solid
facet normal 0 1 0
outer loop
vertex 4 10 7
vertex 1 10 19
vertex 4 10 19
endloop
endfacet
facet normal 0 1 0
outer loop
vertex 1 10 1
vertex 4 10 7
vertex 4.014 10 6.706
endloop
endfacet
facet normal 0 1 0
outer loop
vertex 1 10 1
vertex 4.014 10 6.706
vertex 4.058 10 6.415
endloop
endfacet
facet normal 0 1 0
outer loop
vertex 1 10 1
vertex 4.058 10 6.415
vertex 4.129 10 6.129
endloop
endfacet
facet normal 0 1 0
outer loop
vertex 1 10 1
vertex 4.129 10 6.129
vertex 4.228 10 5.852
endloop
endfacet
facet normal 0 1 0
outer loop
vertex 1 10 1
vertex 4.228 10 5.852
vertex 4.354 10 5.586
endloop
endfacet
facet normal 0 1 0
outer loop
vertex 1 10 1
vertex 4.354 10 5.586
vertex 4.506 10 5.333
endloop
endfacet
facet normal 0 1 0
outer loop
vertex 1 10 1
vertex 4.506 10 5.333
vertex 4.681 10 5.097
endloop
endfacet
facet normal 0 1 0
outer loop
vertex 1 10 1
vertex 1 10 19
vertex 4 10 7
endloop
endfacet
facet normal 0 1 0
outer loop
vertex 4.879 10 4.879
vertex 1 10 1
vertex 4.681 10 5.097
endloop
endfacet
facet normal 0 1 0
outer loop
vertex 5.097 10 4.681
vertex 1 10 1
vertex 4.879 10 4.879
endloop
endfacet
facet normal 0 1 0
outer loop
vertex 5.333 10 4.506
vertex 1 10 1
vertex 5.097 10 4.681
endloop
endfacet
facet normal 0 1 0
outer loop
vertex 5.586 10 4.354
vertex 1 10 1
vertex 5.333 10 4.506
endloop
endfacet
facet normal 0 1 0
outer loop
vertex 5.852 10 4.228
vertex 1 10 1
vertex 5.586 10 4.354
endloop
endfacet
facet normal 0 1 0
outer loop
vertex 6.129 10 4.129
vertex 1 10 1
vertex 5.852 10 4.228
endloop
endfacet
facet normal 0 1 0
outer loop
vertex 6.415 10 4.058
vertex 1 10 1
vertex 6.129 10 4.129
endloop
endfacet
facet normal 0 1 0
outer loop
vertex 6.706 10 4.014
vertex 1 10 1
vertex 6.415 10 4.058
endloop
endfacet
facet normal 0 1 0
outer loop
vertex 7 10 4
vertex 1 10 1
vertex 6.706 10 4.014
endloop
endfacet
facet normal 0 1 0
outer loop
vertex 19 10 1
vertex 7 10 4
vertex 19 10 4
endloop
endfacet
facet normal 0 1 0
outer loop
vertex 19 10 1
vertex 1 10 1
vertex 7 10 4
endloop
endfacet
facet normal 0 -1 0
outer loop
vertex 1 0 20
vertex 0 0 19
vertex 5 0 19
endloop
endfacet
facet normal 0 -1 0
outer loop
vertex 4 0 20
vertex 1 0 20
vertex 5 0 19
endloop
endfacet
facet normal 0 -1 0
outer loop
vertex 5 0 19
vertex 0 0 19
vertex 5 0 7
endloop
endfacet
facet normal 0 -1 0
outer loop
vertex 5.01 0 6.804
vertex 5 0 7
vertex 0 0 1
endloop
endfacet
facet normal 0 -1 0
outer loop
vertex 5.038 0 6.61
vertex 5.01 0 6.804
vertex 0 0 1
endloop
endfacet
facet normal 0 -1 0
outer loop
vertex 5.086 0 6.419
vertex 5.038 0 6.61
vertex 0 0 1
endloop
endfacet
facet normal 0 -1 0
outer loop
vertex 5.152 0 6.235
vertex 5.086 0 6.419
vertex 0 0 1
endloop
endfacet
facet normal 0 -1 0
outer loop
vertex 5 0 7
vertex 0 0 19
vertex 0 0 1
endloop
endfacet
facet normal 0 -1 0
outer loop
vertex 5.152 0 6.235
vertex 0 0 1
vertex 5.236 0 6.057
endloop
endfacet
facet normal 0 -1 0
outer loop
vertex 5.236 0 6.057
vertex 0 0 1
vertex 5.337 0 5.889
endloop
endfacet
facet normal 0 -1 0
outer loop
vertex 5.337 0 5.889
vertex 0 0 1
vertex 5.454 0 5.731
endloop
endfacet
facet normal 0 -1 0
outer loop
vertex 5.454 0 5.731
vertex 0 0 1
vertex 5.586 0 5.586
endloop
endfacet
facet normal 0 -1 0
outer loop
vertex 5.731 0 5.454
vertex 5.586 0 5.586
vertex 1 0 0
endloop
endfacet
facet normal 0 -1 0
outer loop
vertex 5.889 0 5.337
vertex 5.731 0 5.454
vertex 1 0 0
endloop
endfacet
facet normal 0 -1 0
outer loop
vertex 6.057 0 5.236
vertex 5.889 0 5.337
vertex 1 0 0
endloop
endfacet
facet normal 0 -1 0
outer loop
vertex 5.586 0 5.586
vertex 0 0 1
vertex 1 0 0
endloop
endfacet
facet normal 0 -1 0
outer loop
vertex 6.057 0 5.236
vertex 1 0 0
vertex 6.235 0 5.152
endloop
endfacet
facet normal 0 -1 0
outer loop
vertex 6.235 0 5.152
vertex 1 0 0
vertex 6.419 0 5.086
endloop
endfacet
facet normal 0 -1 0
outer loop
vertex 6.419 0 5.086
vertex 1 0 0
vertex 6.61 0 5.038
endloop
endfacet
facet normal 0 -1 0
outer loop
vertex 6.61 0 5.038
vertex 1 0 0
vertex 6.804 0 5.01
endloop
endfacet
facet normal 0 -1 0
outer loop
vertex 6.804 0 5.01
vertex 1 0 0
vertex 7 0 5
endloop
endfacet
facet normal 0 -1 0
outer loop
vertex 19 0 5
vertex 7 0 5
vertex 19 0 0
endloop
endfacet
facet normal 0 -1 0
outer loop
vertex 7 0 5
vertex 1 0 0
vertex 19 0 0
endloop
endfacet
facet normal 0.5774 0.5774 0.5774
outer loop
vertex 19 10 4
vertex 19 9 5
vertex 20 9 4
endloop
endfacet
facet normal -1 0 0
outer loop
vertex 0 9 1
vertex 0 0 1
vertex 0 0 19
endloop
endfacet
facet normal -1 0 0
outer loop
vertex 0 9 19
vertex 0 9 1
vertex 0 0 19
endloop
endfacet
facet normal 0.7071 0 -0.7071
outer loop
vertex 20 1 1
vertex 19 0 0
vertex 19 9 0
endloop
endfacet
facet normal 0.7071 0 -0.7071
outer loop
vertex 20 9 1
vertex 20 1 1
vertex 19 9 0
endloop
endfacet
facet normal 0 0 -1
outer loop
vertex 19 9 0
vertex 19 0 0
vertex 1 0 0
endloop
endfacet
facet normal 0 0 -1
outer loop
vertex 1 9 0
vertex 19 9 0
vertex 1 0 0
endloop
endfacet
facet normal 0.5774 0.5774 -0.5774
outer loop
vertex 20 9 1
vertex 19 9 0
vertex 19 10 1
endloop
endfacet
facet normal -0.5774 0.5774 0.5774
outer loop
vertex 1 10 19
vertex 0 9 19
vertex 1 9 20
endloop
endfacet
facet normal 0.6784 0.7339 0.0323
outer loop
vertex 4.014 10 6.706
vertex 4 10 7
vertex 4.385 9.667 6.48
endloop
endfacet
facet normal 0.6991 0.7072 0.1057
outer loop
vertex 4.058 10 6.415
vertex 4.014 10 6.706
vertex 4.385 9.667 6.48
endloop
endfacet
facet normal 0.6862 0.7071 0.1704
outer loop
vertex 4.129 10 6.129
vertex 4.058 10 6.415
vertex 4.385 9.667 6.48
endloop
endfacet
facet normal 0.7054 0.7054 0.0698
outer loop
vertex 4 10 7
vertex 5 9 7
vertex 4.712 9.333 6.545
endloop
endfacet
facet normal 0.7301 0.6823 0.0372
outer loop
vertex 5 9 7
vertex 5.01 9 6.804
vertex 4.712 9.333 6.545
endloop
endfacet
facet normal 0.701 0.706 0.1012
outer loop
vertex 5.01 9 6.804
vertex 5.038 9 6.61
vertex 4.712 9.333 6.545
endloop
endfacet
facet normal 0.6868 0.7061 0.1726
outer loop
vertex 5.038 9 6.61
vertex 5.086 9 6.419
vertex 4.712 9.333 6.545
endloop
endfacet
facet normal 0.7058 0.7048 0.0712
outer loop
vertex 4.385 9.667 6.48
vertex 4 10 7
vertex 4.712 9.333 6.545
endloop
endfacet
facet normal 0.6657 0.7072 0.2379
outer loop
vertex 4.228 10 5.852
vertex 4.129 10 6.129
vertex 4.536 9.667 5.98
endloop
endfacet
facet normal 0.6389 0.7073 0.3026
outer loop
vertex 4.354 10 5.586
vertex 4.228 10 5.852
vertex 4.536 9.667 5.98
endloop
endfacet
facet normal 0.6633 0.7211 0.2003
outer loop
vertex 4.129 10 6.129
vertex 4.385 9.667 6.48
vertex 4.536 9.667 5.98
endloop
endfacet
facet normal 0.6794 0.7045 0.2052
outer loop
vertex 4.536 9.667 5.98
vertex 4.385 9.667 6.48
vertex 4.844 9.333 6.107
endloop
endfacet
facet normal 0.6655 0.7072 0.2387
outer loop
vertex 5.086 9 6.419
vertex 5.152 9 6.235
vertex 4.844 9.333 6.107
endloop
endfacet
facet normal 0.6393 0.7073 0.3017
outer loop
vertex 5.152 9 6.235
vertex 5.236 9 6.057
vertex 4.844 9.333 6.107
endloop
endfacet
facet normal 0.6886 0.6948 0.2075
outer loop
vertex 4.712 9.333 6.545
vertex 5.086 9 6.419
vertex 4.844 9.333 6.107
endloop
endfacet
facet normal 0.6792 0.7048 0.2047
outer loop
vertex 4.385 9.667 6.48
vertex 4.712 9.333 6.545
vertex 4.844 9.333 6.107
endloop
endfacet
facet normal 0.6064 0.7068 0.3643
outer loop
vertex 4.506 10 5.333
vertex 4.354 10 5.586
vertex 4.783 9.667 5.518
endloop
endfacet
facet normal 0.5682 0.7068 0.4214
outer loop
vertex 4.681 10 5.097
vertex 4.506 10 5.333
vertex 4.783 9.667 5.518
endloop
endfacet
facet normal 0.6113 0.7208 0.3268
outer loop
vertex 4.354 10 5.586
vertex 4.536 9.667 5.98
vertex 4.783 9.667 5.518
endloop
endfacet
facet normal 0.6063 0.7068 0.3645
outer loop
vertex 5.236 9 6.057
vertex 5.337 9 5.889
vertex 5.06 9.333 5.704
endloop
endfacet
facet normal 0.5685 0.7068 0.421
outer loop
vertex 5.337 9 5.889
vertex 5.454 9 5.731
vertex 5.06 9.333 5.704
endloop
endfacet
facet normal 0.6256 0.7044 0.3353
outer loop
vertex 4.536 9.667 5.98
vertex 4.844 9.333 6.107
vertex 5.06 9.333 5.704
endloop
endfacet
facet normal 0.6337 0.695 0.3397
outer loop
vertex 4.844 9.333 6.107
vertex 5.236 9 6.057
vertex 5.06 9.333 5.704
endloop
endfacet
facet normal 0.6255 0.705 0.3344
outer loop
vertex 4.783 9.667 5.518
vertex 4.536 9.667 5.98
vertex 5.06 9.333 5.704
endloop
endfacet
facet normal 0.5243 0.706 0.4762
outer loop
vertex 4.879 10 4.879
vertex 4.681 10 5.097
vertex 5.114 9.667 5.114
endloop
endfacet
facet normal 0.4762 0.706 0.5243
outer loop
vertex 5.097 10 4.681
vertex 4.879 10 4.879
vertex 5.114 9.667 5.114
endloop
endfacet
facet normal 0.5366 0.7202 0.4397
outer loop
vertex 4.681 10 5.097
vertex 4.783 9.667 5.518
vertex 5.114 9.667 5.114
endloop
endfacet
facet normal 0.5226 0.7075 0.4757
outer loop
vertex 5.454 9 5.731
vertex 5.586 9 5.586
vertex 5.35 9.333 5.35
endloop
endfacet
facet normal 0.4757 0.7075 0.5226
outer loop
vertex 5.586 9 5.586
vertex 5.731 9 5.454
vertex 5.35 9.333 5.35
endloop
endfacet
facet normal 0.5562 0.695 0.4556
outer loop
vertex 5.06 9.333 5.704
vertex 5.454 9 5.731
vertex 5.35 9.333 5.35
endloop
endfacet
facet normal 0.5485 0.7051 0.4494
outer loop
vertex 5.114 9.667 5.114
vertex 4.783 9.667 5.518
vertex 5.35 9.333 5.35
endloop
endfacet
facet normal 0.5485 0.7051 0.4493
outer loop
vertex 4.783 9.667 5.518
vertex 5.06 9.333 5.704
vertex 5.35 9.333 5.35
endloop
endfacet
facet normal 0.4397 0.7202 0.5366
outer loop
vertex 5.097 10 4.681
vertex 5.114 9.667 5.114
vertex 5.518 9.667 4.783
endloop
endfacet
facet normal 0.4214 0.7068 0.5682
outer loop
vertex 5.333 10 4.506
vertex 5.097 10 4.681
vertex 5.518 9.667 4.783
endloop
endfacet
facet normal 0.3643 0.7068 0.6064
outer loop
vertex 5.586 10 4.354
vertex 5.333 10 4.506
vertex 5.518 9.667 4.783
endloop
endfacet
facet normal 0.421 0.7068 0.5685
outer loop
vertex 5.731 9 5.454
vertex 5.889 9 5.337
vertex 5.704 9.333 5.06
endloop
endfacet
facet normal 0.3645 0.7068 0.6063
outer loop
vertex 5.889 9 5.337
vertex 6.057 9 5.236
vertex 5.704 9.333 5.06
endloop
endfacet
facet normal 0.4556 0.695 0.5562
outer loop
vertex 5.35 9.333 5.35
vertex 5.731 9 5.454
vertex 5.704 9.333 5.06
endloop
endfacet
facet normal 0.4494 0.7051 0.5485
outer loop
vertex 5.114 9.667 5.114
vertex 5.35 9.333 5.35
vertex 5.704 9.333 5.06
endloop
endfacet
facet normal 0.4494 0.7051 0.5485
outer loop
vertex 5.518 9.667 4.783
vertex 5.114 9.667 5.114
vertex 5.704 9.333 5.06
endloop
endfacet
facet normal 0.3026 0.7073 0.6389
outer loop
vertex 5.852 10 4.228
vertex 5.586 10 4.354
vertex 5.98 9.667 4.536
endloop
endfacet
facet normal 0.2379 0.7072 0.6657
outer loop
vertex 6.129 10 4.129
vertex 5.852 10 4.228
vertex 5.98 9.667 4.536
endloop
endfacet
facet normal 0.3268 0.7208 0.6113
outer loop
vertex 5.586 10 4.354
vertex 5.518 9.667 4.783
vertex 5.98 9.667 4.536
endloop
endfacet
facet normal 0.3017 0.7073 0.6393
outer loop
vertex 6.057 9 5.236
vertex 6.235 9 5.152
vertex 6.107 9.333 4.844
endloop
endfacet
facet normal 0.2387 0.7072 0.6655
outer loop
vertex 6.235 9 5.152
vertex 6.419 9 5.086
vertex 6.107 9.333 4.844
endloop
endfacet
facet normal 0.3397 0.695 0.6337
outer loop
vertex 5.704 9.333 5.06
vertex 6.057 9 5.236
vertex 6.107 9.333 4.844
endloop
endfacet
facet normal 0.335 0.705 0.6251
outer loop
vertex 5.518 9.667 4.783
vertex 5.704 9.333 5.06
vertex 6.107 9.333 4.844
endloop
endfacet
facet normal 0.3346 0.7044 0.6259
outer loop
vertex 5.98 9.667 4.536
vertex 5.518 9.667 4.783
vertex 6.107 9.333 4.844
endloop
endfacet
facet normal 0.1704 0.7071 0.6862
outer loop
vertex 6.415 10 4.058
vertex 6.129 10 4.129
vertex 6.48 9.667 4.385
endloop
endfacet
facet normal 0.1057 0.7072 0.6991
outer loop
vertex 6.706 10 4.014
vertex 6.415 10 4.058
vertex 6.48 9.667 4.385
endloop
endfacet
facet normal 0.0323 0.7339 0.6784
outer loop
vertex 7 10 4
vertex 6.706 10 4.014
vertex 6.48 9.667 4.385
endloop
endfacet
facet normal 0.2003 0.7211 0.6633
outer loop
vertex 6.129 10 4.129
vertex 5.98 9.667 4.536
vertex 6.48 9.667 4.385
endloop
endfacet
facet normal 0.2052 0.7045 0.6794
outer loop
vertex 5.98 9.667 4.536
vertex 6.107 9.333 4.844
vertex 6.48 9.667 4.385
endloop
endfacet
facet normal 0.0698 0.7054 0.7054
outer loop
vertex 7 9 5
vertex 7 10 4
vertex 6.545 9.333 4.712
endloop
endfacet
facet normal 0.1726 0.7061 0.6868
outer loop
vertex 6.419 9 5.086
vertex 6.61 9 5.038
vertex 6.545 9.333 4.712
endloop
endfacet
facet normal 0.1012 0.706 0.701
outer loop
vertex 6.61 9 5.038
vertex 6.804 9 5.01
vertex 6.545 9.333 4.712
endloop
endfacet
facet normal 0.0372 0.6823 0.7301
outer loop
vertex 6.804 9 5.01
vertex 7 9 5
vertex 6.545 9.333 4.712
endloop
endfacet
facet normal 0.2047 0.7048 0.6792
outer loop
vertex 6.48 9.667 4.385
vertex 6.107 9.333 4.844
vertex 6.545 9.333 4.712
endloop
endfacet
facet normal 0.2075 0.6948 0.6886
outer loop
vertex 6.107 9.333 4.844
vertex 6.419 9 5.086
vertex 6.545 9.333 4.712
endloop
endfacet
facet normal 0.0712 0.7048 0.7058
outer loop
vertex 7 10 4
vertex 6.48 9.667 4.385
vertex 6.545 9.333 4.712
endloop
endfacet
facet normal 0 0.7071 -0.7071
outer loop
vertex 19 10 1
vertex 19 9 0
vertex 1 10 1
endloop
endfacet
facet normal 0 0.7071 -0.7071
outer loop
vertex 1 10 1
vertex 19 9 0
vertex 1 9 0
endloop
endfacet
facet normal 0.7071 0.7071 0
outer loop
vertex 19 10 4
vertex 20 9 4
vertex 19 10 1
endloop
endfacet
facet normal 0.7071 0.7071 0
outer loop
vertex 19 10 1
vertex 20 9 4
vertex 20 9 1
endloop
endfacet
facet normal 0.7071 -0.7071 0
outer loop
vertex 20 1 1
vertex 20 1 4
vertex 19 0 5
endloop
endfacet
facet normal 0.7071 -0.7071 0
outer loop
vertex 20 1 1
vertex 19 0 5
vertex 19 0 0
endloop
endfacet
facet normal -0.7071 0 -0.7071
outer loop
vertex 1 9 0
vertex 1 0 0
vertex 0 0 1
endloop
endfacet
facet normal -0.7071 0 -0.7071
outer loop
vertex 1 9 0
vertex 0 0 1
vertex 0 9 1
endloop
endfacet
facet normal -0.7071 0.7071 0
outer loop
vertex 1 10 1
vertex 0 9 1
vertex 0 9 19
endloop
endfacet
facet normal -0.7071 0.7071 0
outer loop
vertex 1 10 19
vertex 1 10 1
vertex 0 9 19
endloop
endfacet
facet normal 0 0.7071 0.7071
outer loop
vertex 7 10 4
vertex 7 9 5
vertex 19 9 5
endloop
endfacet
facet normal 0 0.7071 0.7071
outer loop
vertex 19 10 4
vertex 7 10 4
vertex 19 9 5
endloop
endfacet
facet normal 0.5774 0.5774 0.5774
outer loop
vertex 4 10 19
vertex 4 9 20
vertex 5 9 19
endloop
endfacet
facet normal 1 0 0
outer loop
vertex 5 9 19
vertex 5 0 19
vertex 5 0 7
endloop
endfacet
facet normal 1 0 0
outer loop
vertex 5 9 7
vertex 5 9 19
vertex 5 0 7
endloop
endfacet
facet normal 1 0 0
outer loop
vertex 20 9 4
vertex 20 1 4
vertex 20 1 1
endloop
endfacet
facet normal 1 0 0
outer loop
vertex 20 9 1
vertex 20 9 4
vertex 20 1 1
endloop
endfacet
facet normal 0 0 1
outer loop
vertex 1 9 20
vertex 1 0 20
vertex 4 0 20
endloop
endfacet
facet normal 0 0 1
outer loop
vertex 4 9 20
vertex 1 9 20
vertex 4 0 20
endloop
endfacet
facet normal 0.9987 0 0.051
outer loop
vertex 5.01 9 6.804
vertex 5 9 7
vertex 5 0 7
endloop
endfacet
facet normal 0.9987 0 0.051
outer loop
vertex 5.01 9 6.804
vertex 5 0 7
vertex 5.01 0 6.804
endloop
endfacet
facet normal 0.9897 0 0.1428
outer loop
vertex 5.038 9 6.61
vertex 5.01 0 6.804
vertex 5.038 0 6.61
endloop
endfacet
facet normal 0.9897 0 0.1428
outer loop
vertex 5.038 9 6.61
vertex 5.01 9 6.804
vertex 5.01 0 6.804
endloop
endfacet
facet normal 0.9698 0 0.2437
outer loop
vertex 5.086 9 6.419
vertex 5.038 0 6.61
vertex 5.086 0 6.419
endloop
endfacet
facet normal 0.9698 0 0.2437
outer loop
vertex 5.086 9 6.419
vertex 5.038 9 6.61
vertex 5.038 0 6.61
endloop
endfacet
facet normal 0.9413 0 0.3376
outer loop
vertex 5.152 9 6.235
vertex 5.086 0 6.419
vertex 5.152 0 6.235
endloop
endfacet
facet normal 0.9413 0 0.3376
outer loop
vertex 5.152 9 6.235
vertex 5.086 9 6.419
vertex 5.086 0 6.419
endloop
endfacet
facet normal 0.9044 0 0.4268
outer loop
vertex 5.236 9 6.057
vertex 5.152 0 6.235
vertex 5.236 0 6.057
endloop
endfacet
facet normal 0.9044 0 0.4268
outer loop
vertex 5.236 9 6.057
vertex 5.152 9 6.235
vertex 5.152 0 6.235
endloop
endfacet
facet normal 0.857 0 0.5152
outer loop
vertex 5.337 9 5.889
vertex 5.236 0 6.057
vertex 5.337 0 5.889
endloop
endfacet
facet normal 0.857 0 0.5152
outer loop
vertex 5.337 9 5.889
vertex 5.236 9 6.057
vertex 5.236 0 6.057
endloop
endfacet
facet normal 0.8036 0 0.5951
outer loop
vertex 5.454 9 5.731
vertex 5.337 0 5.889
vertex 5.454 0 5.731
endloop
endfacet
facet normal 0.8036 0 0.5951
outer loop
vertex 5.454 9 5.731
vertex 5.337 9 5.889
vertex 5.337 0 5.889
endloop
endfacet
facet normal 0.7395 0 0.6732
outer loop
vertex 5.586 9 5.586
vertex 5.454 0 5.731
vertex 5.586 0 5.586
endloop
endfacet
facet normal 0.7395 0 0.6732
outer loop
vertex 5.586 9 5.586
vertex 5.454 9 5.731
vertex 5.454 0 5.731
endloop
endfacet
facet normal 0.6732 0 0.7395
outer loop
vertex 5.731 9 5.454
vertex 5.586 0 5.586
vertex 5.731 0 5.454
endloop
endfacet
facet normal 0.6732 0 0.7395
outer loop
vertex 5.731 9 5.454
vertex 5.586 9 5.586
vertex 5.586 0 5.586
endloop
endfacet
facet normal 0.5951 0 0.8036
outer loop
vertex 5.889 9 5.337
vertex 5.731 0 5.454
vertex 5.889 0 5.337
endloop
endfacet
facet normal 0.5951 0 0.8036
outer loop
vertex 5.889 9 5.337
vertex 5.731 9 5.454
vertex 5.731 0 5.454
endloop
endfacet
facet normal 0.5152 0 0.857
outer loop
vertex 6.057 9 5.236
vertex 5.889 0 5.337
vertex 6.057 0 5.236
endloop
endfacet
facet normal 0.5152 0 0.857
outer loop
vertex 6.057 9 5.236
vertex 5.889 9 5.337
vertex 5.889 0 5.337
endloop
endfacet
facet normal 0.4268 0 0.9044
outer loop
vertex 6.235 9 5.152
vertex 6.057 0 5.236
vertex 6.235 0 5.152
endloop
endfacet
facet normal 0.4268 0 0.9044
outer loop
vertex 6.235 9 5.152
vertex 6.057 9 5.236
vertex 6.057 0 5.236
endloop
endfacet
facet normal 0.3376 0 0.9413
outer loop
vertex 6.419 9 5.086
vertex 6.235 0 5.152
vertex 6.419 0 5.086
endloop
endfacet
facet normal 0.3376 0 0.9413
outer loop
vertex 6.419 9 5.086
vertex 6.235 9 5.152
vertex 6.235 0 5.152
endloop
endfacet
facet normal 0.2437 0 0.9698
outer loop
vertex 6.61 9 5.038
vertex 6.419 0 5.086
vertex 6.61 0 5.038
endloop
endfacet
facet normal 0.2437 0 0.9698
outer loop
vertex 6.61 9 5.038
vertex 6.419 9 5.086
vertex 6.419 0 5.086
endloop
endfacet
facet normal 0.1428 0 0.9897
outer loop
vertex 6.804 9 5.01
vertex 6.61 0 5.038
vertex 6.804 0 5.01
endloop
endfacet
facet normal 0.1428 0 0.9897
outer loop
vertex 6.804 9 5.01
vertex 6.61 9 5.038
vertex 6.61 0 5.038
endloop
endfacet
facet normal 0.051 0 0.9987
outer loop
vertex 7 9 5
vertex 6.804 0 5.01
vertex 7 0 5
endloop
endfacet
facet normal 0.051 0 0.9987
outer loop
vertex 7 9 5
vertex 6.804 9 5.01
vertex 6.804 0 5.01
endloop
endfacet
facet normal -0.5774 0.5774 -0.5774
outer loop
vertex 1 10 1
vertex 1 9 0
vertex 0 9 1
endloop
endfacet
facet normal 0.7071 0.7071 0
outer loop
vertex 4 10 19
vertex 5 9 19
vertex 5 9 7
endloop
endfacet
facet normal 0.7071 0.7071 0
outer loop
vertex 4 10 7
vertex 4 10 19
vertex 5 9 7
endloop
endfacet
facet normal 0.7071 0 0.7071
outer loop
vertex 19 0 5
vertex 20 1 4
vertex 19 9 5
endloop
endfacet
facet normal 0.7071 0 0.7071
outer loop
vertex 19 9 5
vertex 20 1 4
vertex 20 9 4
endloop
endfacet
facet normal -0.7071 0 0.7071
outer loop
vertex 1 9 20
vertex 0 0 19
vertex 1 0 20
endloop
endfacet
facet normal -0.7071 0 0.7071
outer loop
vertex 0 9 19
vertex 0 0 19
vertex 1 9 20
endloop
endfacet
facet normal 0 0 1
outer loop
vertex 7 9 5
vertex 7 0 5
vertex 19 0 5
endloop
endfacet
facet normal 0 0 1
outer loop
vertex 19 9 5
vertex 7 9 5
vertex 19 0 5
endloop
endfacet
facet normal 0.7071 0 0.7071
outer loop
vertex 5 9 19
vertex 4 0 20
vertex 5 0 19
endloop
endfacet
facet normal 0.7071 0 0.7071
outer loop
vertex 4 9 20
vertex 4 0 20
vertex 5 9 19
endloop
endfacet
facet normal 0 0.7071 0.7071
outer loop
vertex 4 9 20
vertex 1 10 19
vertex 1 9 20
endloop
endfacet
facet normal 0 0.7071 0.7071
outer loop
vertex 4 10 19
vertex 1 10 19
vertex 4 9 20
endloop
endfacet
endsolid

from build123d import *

# Parameters (mm, degrees)
EXTRUDE_1_DEPTH = 10
FILLET_1_R      = 2
CHAMFER_1_SIZE  = 1


with BuildPart() as part:
    # 草图1 → 凸台-拉伸1 (new body)
    with BuildSketch(Plane(origin=(0, 0, 0), x_dir=(1, 0, 0), z_dir=(0, 1, 0))):
        Polygon((5, 0), (0, 0), (0, -5), (0, -20), (5, -20), (5, -5), (20, -5), (20, 0), align=None)
    extrude(amount=EXTRUDE_1_DEPTH)

    # 圆角1
    fillet_1_edges = [part.edges().sort_by_distance(p)[0] for p in [
        (5, 5, 5),
    ]]
    fillet(fillet_1_edges, radius=FILLET_1_R)

    # 倒角1
    chamfer_1_edges = [part.edges().sort_by_distance(p)[0] for p in [
        (20, 0, 2.5),
        (10, 10, 0),
        (20, 5, 5),
        (5, 5, 20),
        (0, 5, 20),
        (0, 5, 0),
        (20, 5, 0),
        (0, 10, 10),
        (2.5, 10, 20),
        (13.5, 10, 5),
        (5, 10, 13.5),
        (5.585786438, 10, 5.585786438),
        (20, 10, 2.5),
    ]]
    chamfer(chamfer_1_edges, length=CHAMFER_1_SIZE)


solid = part.part
